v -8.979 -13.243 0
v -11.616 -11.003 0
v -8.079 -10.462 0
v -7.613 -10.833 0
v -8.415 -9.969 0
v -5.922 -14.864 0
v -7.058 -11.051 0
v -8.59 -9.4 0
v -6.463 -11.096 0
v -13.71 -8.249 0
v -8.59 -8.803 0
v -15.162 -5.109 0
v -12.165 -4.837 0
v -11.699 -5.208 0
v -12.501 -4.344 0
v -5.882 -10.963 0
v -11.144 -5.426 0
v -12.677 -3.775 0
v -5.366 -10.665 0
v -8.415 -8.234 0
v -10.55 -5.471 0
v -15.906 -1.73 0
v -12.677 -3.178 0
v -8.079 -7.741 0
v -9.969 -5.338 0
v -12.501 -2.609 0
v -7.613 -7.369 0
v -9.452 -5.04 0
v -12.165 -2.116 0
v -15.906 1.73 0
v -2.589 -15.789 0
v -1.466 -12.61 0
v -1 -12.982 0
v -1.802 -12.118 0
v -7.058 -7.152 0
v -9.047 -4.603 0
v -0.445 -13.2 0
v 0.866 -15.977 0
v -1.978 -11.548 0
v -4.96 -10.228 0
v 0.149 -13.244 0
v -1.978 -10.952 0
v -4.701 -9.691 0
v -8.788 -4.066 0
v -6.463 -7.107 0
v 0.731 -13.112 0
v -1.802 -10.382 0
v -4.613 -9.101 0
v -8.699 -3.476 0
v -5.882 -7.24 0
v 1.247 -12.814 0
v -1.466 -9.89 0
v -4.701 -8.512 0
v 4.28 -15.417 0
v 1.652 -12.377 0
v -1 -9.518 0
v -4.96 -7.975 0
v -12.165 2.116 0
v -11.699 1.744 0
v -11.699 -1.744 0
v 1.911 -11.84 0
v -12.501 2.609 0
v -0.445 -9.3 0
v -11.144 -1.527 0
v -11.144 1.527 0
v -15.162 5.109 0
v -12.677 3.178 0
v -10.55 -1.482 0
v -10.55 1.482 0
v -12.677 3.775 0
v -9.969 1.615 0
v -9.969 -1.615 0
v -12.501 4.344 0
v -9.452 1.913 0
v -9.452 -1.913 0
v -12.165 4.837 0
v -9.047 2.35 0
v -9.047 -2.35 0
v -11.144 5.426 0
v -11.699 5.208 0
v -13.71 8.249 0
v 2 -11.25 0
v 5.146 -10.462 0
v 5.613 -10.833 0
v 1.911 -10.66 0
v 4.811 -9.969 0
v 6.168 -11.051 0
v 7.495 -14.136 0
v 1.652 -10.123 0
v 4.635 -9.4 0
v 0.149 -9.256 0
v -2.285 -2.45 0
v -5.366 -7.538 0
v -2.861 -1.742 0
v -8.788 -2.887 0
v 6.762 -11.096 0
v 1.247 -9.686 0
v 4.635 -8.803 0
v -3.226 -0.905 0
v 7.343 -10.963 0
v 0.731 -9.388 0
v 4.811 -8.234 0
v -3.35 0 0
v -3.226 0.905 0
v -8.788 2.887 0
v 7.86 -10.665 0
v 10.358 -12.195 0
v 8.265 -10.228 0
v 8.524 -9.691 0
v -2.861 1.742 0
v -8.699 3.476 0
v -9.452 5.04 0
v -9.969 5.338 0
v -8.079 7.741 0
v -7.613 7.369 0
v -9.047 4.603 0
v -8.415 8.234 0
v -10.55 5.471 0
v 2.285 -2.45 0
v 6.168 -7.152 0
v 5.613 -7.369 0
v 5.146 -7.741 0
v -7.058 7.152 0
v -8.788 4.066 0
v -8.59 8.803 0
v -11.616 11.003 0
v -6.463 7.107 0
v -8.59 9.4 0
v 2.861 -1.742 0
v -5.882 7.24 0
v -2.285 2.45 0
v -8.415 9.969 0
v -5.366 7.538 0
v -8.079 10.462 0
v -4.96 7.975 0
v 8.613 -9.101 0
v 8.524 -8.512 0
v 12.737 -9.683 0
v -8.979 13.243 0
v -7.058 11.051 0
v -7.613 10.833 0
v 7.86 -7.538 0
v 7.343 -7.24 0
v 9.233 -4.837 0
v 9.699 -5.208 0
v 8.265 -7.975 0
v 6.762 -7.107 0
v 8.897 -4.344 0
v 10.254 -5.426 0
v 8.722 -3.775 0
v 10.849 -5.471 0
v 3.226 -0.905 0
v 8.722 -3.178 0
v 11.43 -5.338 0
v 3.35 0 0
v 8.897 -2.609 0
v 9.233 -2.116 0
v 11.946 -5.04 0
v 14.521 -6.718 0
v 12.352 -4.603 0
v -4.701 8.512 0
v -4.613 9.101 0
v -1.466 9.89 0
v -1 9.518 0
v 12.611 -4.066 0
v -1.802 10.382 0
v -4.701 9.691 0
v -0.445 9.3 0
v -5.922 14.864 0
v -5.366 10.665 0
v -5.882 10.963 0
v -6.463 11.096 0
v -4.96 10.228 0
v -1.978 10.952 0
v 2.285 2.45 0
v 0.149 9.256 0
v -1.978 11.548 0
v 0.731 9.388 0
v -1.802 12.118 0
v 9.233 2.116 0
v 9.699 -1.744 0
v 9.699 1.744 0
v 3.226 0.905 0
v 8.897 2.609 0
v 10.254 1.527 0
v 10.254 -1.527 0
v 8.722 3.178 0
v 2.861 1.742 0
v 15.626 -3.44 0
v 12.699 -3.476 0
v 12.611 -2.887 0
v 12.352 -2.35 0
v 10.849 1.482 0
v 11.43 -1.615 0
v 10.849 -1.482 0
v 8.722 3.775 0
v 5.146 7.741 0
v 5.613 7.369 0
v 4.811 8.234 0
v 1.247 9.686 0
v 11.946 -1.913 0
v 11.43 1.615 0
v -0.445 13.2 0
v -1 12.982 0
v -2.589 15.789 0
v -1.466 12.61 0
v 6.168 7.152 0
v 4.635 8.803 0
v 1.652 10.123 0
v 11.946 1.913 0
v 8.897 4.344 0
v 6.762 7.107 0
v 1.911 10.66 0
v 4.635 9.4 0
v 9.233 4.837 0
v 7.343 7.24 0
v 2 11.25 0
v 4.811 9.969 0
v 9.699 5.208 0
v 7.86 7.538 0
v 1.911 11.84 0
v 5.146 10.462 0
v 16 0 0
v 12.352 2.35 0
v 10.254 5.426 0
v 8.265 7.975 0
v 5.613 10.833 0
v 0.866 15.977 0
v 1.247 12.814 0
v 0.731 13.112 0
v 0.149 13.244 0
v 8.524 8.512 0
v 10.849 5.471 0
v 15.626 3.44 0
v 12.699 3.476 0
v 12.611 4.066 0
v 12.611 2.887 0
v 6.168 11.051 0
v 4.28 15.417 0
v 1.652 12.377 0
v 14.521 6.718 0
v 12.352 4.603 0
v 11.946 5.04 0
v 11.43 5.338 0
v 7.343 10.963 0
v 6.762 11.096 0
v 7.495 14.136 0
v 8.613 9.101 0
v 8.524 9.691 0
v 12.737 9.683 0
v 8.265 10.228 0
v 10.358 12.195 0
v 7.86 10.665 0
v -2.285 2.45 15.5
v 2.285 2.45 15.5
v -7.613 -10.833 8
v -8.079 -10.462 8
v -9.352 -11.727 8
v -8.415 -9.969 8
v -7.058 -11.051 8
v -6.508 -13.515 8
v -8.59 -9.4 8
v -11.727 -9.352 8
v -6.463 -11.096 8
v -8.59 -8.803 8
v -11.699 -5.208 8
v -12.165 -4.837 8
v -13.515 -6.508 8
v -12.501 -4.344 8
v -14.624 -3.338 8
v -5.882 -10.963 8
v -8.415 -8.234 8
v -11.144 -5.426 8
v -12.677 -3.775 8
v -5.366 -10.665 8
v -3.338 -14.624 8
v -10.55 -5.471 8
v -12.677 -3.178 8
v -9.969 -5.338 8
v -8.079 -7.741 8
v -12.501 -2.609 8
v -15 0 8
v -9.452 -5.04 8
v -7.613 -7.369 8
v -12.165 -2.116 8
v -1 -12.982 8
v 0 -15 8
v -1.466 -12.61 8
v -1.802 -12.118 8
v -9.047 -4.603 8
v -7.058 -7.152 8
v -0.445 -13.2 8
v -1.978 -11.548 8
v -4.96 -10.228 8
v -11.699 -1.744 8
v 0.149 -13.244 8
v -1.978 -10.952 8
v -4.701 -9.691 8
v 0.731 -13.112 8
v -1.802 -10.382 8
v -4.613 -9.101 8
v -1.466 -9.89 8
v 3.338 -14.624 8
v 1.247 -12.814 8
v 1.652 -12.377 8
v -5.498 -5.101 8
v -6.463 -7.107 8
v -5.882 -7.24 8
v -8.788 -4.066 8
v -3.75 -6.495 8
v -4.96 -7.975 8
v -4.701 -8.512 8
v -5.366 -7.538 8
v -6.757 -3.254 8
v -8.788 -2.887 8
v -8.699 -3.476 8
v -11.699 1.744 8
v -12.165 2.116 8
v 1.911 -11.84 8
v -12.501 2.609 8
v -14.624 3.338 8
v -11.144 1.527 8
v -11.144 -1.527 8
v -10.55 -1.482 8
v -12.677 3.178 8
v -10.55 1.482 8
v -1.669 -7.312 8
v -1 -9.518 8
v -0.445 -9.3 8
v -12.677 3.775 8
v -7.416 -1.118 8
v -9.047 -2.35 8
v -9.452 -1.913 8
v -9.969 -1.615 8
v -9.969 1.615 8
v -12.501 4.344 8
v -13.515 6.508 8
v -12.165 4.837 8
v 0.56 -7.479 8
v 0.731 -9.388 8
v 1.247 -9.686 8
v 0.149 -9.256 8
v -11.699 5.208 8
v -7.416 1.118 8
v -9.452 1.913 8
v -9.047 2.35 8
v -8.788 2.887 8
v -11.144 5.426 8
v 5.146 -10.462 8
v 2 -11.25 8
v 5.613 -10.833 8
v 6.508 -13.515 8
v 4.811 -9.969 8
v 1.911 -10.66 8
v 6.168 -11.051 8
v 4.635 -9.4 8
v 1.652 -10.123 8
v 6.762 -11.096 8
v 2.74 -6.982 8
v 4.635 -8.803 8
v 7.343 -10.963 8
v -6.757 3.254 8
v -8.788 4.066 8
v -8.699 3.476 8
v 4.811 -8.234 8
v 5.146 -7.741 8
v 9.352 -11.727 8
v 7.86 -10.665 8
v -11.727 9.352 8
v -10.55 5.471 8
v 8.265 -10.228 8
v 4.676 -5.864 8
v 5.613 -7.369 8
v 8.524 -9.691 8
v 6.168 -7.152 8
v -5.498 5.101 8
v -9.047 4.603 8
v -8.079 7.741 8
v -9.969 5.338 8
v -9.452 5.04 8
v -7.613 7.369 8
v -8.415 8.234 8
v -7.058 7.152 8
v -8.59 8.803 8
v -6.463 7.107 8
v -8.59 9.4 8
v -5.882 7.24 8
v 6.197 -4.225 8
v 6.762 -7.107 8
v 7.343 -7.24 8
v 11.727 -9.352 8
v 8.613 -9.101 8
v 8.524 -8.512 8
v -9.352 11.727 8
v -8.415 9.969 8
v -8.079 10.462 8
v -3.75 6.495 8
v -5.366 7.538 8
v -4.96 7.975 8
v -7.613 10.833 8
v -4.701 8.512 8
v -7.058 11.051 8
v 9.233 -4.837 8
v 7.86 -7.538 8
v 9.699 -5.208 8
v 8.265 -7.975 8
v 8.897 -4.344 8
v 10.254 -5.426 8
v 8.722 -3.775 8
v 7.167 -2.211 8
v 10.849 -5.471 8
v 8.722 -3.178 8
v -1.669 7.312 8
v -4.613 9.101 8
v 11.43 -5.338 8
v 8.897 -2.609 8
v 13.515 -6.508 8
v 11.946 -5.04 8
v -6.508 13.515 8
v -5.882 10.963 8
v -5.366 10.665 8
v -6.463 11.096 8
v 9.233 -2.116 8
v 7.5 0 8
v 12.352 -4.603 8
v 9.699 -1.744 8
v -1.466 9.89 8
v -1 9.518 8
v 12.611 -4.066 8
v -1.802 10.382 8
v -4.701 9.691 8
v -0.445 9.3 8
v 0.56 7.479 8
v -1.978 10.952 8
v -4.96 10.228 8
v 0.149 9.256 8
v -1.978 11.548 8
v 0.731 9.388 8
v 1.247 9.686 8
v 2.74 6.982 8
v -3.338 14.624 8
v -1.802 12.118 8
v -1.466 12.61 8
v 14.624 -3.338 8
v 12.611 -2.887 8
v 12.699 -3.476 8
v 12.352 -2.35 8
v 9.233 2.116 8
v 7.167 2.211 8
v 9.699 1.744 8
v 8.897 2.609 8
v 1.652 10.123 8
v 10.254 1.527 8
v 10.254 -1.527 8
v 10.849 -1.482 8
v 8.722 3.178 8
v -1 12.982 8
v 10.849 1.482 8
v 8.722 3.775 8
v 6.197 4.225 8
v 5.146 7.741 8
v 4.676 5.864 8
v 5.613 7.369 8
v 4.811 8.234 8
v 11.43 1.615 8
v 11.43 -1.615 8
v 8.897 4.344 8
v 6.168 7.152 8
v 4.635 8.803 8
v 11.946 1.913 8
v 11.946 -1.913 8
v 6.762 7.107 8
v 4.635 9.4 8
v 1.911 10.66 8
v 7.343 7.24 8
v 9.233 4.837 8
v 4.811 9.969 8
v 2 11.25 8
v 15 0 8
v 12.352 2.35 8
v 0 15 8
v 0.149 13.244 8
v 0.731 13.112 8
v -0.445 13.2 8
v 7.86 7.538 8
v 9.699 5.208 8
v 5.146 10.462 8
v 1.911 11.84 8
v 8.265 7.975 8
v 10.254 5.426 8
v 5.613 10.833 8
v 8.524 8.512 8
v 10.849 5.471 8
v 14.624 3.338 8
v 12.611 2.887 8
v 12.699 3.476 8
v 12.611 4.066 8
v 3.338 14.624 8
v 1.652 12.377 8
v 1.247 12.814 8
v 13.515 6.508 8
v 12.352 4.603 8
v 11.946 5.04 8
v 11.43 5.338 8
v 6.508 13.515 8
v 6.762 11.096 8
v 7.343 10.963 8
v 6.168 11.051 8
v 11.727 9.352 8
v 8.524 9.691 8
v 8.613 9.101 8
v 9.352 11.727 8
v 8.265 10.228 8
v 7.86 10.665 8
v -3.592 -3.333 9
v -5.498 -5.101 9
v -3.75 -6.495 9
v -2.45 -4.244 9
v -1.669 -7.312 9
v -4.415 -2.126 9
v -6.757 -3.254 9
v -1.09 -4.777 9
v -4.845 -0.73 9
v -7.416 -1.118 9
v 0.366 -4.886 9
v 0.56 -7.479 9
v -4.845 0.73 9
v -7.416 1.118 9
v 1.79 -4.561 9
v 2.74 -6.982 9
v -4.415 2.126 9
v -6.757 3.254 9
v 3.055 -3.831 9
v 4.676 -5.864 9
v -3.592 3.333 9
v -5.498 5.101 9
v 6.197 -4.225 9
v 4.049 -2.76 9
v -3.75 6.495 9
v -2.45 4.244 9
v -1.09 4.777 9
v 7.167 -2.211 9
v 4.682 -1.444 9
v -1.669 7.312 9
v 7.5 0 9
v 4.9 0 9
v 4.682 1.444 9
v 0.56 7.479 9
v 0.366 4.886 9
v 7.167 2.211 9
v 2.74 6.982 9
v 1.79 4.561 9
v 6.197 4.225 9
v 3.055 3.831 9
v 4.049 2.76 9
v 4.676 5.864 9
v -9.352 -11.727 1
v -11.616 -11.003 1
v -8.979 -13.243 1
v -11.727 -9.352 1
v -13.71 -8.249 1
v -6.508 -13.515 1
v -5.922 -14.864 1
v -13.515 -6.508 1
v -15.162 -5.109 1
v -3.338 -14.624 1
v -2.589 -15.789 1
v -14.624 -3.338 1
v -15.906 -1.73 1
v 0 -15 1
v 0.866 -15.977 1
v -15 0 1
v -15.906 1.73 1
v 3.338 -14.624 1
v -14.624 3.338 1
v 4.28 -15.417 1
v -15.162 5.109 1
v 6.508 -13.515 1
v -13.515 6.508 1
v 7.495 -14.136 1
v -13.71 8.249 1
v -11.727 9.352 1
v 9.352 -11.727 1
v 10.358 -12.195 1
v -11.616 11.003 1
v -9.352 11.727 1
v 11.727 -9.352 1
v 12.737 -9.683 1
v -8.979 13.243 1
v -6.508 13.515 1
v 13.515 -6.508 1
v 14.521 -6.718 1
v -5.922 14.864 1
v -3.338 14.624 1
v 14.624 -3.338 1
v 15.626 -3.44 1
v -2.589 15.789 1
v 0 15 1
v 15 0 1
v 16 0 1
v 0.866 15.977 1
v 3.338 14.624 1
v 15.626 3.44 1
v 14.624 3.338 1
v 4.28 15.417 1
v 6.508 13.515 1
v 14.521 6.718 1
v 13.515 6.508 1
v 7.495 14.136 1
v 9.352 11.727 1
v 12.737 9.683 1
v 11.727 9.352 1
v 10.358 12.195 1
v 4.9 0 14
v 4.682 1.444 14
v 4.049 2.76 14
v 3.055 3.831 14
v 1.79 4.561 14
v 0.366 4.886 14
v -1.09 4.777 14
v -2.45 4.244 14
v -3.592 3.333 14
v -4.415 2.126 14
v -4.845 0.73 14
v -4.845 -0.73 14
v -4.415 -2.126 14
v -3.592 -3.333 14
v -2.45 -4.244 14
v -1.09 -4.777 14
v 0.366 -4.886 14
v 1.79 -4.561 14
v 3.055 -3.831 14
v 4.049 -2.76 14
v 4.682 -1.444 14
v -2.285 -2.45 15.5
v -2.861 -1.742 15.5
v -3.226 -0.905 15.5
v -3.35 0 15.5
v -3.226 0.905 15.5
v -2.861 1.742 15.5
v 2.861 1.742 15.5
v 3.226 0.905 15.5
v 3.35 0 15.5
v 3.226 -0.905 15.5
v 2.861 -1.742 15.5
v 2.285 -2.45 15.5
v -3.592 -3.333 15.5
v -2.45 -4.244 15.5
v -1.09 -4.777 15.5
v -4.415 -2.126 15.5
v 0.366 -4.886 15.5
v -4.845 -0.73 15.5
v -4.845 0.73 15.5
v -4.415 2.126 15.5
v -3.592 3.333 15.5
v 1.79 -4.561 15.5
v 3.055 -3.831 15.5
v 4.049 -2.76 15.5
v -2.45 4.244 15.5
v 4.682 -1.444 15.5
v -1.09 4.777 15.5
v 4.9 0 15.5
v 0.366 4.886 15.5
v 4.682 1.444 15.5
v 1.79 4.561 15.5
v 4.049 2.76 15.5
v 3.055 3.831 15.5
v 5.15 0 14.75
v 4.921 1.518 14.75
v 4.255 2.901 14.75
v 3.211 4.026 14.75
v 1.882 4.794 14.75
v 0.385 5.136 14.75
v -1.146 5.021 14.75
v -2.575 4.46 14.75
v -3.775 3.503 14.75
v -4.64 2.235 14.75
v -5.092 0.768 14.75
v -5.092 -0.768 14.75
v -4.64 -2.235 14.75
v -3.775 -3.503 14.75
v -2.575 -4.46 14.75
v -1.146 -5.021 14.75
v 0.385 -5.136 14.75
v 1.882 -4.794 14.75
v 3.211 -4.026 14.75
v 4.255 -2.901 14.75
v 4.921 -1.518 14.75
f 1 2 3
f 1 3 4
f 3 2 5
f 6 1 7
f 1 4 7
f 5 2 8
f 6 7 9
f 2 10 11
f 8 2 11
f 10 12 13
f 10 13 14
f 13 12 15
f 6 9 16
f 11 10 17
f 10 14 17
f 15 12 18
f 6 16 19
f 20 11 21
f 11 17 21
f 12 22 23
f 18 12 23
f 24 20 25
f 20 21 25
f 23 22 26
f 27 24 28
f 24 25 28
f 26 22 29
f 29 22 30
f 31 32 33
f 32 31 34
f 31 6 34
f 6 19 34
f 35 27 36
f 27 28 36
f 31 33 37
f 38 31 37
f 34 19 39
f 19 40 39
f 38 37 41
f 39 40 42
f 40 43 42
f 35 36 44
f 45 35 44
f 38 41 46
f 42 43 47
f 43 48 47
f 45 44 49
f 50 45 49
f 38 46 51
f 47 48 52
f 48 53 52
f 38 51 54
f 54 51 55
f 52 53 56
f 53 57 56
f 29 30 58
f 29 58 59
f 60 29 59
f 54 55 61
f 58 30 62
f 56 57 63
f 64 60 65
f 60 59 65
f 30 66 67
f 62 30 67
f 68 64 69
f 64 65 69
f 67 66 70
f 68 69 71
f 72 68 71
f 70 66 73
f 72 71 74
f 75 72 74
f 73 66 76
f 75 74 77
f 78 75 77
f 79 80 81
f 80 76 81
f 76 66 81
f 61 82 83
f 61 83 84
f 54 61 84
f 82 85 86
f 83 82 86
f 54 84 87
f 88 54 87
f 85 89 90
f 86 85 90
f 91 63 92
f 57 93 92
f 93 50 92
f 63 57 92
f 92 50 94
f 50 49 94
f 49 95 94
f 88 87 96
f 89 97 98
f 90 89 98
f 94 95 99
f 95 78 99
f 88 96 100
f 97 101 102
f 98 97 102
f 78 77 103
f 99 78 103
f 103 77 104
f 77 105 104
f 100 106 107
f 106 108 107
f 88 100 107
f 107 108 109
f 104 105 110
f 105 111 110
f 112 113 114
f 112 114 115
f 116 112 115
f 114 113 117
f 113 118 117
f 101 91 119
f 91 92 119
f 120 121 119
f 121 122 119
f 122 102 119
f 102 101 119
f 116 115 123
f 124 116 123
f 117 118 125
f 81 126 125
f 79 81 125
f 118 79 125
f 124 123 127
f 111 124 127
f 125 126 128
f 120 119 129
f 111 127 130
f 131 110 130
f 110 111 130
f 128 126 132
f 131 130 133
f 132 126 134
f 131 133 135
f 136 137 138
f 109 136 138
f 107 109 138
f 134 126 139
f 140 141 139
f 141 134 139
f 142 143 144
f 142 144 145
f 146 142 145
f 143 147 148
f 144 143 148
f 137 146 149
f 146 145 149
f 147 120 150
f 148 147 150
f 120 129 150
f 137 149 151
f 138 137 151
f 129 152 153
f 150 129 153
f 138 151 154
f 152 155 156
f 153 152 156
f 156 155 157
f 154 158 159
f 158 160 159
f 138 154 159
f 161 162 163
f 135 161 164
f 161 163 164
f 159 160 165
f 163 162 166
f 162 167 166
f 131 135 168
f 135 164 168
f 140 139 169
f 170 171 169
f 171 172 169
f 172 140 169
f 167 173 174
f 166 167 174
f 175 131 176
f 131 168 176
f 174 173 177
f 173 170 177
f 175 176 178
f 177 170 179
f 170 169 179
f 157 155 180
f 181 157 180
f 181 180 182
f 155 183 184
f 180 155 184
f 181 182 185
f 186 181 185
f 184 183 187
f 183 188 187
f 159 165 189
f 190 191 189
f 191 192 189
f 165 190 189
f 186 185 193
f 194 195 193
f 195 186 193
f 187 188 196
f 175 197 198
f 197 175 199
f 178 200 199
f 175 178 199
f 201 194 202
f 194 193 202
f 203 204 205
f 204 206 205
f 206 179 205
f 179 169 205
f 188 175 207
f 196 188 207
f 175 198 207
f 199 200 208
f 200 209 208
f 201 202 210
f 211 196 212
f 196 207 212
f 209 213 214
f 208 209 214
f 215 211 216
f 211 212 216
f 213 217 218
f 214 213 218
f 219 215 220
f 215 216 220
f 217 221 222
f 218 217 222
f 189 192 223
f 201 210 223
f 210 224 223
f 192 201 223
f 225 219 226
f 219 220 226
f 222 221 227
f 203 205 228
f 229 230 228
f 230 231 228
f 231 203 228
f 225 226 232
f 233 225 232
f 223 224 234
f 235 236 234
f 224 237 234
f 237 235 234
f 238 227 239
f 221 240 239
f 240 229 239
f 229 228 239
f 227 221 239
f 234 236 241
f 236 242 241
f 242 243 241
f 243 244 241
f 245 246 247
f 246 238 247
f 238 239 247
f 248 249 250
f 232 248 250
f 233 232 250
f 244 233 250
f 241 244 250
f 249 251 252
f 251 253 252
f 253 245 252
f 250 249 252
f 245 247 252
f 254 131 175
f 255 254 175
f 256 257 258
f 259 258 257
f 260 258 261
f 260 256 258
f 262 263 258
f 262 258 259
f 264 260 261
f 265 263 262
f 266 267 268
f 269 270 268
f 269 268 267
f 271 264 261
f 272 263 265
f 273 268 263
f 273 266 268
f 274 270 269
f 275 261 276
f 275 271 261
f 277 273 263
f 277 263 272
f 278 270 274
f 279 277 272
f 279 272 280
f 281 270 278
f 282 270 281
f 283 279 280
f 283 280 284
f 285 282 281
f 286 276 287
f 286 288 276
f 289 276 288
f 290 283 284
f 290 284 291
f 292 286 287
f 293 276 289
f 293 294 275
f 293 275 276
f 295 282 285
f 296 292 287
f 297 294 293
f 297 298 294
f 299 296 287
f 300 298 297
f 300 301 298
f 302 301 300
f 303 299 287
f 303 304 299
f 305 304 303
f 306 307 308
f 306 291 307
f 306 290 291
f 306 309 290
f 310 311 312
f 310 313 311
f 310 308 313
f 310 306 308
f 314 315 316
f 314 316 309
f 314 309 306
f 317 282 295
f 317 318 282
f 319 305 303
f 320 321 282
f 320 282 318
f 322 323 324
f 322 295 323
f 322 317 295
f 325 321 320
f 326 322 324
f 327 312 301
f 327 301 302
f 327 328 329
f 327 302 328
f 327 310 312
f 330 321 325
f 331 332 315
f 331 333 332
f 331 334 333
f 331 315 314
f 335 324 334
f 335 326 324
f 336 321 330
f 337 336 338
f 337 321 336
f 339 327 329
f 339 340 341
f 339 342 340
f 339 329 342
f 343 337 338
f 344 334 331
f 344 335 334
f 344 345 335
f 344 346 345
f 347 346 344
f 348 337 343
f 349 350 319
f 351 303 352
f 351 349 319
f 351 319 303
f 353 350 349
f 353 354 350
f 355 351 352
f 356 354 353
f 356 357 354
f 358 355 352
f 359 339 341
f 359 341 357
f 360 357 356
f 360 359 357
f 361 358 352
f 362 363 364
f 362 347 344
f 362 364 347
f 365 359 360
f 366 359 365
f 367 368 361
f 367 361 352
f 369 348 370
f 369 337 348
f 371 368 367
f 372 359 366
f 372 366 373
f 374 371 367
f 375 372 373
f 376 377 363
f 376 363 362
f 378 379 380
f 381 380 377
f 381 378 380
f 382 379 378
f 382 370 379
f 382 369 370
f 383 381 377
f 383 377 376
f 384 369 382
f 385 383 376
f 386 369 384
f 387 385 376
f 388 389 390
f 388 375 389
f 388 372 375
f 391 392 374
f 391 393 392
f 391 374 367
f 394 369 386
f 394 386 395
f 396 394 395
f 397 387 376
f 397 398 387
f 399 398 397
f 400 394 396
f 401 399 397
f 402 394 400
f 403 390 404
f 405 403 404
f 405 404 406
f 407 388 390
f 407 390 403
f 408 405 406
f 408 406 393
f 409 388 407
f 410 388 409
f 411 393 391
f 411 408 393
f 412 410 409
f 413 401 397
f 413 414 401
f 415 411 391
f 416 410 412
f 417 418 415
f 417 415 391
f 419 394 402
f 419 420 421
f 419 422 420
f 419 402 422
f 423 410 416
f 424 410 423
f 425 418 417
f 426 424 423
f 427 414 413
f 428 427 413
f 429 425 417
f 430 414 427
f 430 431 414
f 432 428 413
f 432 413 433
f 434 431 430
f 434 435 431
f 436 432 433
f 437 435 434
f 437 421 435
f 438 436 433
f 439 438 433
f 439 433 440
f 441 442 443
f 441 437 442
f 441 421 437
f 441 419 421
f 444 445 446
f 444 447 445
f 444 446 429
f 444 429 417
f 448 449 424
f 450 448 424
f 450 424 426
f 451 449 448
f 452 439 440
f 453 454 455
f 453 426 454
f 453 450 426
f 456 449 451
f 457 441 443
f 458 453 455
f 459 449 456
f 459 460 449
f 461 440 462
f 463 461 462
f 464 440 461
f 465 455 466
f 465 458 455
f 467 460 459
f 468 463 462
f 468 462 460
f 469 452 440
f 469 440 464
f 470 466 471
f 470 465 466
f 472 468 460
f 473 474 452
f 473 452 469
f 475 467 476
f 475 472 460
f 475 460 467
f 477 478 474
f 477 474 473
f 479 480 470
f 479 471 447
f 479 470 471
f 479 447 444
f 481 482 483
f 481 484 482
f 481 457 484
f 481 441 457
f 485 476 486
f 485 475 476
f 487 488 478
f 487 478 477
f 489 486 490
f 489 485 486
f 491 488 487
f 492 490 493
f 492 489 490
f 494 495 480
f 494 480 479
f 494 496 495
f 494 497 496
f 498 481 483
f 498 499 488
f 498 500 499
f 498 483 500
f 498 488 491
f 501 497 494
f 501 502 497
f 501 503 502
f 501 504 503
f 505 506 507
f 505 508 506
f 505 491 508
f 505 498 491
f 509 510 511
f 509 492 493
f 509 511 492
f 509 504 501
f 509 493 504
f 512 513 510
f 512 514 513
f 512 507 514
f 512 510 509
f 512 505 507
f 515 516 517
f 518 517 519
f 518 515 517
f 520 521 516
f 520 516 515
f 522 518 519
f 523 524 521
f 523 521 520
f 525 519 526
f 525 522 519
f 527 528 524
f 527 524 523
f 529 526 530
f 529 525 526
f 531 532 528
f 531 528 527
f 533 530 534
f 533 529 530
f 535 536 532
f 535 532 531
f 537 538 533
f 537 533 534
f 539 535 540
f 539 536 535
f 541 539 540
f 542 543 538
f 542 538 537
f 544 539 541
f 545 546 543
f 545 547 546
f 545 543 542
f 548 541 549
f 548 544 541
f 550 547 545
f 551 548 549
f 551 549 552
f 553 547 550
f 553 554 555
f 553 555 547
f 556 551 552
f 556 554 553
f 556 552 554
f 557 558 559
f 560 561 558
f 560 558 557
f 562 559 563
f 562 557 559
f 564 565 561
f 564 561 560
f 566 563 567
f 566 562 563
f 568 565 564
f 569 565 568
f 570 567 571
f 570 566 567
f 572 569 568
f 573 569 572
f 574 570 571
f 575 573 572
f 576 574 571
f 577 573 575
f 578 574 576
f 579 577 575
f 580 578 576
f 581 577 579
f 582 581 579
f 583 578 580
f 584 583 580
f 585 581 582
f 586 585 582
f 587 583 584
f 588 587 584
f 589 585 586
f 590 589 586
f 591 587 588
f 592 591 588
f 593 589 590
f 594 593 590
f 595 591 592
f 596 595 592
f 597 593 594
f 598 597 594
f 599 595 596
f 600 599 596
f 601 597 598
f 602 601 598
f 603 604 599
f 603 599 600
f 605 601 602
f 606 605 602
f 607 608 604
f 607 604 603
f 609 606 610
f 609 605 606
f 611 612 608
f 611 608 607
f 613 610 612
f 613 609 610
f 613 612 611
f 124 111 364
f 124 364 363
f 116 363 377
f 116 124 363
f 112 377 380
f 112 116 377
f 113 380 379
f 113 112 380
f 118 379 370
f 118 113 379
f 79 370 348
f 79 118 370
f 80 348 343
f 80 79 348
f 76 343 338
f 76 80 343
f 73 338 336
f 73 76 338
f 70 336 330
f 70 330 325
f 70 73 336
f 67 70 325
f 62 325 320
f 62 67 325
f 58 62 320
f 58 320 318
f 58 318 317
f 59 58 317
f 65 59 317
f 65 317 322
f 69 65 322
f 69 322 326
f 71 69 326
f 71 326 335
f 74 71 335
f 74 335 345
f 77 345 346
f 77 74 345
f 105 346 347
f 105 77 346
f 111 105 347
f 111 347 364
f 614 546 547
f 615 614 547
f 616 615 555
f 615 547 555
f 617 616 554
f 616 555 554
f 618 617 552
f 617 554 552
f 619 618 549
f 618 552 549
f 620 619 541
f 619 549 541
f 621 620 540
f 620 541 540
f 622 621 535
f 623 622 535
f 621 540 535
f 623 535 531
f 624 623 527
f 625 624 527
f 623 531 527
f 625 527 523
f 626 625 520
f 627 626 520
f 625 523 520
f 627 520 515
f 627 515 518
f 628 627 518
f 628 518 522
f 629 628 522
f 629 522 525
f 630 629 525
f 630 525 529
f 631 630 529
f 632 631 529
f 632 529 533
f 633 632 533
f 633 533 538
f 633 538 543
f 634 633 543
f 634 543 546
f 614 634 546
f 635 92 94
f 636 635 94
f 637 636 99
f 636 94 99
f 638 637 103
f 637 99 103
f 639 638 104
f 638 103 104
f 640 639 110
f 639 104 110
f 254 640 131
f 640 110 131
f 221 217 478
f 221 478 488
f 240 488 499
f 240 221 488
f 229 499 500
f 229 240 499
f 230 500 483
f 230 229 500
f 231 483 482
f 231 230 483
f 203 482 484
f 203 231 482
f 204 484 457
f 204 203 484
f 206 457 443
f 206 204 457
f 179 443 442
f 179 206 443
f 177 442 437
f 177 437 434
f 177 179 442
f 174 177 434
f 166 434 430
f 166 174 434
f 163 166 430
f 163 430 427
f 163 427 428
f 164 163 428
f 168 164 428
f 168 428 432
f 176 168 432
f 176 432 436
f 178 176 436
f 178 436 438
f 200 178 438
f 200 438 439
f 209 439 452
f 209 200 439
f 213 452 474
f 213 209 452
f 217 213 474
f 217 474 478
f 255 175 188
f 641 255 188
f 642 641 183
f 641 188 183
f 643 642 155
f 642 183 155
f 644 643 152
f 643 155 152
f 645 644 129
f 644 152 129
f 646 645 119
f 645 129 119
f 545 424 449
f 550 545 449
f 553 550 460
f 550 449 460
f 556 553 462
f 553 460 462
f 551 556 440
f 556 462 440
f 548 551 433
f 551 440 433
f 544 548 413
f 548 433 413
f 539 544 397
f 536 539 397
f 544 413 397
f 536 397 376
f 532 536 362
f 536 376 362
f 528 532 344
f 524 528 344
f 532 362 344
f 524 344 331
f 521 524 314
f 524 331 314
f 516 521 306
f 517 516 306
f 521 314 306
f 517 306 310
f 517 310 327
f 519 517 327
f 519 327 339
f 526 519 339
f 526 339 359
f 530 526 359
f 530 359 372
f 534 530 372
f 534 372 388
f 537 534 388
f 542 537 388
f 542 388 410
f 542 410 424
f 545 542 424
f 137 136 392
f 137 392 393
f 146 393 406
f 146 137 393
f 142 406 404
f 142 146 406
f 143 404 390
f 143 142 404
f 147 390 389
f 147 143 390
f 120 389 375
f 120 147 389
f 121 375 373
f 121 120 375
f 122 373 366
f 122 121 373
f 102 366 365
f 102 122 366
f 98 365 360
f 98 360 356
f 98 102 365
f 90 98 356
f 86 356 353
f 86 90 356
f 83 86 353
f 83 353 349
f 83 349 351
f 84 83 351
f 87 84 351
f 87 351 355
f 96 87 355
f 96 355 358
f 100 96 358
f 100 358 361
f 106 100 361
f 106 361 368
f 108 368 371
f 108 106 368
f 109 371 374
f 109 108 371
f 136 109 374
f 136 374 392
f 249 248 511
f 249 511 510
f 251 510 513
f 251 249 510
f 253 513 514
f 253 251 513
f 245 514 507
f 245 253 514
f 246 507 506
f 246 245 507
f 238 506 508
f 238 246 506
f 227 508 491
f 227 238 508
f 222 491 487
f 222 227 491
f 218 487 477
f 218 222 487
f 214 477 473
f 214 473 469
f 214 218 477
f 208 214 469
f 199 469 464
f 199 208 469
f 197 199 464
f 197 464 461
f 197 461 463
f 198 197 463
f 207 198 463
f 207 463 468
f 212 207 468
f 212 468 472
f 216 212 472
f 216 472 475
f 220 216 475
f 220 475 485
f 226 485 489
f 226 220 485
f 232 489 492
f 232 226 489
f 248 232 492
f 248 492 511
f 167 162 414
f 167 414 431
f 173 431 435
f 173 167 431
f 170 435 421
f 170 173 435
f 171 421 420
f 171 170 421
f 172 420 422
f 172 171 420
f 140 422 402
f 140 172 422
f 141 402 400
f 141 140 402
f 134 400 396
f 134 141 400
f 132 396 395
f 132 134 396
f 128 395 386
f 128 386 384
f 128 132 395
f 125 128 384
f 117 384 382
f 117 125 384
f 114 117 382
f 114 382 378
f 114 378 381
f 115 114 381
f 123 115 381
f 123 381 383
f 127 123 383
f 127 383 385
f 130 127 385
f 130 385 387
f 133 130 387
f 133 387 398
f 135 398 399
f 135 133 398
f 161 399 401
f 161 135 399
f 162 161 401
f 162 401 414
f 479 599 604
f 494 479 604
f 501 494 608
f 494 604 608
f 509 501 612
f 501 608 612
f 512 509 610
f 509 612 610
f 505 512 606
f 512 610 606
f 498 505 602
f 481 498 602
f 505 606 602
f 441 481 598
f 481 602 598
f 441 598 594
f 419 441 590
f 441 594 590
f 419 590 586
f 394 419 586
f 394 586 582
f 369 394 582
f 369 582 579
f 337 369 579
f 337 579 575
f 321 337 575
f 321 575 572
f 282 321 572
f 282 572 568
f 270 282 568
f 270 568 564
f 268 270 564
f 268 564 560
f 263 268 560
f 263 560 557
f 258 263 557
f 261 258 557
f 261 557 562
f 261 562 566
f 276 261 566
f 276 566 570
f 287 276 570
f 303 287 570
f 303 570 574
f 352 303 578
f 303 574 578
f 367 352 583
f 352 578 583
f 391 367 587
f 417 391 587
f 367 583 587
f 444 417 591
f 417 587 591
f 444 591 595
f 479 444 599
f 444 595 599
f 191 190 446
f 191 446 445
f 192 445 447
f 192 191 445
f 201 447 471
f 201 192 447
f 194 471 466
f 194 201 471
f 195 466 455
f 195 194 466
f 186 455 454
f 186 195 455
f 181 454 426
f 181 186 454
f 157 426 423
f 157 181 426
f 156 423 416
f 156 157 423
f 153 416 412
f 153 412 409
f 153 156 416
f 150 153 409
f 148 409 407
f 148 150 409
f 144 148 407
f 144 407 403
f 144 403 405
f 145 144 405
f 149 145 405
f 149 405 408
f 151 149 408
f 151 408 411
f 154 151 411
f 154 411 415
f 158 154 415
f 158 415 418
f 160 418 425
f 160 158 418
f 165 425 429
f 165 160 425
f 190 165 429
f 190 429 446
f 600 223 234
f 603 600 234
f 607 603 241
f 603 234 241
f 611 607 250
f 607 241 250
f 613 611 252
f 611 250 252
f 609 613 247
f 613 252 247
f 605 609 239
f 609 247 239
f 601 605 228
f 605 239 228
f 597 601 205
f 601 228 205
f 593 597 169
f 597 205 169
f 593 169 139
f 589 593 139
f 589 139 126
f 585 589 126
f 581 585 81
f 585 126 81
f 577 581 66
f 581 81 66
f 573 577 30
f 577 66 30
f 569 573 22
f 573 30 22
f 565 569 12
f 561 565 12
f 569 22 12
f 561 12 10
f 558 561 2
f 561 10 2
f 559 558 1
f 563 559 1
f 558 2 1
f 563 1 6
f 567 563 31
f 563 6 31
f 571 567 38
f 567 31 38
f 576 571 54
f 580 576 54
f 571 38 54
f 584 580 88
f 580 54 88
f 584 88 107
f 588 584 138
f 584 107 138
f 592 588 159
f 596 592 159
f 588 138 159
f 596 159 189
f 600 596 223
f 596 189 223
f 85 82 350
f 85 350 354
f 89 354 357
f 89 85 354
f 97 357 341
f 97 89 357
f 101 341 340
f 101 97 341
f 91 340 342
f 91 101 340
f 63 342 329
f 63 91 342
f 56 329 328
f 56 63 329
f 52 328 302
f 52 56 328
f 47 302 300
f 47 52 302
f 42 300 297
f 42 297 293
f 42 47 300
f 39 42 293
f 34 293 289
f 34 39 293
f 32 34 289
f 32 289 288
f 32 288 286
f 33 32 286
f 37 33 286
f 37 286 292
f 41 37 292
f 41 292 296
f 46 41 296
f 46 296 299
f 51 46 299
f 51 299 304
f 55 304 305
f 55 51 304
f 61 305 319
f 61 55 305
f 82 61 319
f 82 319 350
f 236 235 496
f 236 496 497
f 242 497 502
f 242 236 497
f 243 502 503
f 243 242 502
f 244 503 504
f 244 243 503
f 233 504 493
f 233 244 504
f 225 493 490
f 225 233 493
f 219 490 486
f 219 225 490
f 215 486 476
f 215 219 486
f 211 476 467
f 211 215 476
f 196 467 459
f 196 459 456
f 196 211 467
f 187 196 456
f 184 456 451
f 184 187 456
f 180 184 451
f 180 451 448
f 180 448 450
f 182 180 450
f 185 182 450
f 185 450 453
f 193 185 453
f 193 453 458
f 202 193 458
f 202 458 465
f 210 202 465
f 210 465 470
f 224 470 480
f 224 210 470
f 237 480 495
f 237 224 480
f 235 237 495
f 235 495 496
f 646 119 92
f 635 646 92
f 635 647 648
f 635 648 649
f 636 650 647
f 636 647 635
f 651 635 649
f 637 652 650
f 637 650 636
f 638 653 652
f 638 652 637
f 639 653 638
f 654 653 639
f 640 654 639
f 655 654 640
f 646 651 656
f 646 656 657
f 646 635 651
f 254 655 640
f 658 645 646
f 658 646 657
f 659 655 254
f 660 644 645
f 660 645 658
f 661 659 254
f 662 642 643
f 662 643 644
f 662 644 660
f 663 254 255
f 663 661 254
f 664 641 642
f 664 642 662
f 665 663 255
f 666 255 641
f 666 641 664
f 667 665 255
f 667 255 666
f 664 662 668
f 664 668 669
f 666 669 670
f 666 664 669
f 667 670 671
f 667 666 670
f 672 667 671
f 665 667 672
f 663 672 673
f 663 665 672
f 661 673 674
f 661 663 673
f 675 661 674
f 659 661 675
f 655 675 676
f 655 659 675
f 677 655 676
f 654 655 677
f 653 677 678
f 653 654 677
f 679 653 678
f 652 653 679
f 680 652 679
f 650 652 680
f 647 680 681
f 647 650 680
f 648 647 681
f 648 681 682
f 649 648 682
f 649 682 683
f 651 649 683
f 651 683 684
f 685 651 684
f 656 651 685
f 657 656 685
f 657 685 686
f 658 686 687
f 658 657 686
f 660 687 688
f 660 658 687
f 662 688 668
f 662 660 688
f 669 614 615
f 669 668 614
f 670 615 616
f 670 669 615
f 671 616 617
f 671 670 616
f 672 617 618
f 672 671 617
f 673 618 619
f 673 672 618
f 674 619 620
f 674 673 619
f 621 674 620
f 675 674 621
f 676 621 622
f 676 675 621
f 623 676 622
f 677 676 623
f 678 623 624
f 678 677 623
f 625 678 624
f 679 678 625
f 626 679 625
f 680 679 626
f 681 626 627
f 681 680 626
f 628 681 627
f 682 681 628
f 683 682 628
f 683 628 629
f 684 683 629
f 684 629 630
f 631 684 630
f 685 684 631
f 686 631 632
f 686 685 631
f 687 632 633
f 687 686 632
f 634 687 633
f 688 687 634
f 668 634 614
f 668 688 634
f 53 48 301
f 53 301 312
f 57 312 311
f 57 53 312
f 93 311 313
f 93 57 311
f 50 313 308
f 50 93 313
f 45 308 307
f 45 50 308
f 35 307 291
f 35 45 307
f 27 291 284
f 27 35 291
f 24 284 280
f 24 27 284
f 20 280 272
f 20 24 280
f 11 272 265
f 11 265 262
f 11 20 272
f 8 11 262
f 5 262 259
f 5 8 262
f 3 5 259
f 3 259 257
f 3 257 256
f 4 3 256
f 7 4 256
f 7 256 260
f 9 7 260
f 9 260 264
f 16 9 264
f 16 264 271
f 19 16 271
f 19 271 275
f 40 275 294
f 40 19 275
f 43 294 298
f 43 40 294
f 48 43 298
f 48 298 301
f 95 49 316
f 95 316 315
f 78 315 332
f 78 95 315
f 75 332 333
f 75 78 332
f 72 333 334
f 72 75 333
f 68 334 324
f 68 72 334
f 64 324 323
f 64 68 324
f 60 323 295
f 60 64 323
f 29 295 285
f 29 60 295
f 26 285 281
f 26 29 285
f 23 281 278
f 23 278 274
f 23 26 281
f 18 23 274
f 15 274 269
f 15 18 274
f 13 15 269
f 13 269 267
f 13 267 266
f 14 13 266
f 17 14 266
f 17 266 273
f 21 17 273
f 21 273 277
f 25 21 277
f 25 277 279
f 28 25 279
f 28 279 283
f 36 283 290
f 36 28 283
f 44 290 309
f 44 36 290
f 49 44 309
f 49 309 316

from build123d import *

# Parameters (mm, degrees)
F3_R      = 15
F3_R_2    = 2
F3_R_3    = 7.5
F3_R_4    = 4.9
F4_DEPTH  = 8
F5_DEPTH  = 9
F6_DEPTH  = 15.5
F3_R_5    = 16
F11_DEPTH = 1


with BuildPart() as f4:
    # F3 (on Top) → F4 (new body)
    with BuildSketch(Plane.XY):
        Circle(F3_R)
        with Locations((-6.6125840883, -9.1014411867)):
            Circle(F3_R_2, mode=Mode.SUBTRACT)
        with Locations((-10.6993858083, -3.4764411867)):
            Circle(F3_R_2, mode=Mode.SUBTRACT)
        with Locations((0, -11.25)):
            Circle(F3_R_2, mode=Mode.SUBTRACT)
        with Locations((6.6125840883, -9.1014411867)):
            Circle(F3_R_2, mode=Mode.SUBTRACT)
        with Locations((10.6993858083, -3.4764411867)):
            Circle(F3_R_2, mode=Mode.SUBTRACT)
        with Locations((-10.6993858083, 3.4764411867)):
            Circle(F3_R_2, mode=Mode.SUBTRACT)
        with Locations((-6.6125840883, 9.1014411867)):
            Circle(F3_R_2, mode=Mode.SUBTRACT)
        Circle(F3_R_3, mode=Mode.SUBTRACT)
        with Locations((10.6993858083, 3.4764411867)):
            Circle(F3_R_2, mode=Mode.SUBTRACT)
        with Locations((0, 11.25)):
            Circle(F3_R_2, mode=Mode.SUBTRACT)
        with Locations((6.6125840883, 9.1014411867)):
            Circle(F3_R_2, mode=Mode.SUBTRACT)
        Circle(F3_R_3)
        Circle(F3_R_4, mode=Mode.SUBTRACT)
        Circle(F3_R_4)
        with BuildLine():
            ThreePointArc((-2.2847319318, -2.45), (-3.35, 0), (-2.2847319318, 2.45))
            Line((-2.2847319318, 2.45), (2.2847319318, 2.45))
            ThreePointArc((2.2847319318, 2.45), (3.35, 0), (2.2847319318, -2.45))
            Line((2.2847319318, -2.45), (-2.2847319318, -2.45))
        make_face(mode=Mode.SUBTRACT)
    extrude(amount=F4_DEPTH)

    # F3 (on Top) → F5 (join)
    with BuildSketch(Plane.XY):
        Circle(F3_R_3)
        Circle(F3_R_4, mode=Mode.SUBTRACT)
        Circle(F3_R_4)
        with BuildLine():
            ThreePointArc((-2.2847319318, -2.45), (-3.35, 0), (-2.2847319318, 2.45))
            Line((-2.2847319318, 2.45), (2.2847319318, 2.45))
            ThreePointArc((2.2847319318, 2.45), (3.35, 0), (2.2847319318, -2.45))
            Line((2.2847319318, -2.45), (-2.2847319318, -2.45))
        make_face(mode=Mode.SUBTRACT)
    extrude(amount=F5_DEPTH)

    # F3 (on Top) → F6 (join)
    with BuildSketch(Plane.XY):
        Circle(F3_R_4)
        with BuildLine():
            ThreePointArc((-2.2847319318, -2.45), (-3.35, 0), (-2.2847319318, 2.45))
            Line((-2.2847319318, 2.45), (2.2847319318, 2.45))
            ThreePointArc((2.2847319318, 2.45), (3.35, 0), (2.2847319318, -2.45))
            Line((2.2847319318, -2.45), (-2.2847319318, -2.45))
        make_face(mode=Mode.SUBTRACT)
    extrude(amount=F6_DEPTH)

    # F7 (on Front) → F8 (revolve)
    with BuildSketch(Plane.XZ):
        Polygon((5.15, 14.75), (4.9, 15.5), (4.9, 14), align=None)
    revolve(axis=Axis((0, 0, 8.7542282417), (0, 0, 1)))

    # F3 (on Top) → F11 (join)
    with BuildSketch(Plane.XY):
        Circle(F3_R_5)
        Circle(F3_R, mode=Mode.SUBTRACT)
    extrude(amount=F11_DEPTH)


solid = f4.part
